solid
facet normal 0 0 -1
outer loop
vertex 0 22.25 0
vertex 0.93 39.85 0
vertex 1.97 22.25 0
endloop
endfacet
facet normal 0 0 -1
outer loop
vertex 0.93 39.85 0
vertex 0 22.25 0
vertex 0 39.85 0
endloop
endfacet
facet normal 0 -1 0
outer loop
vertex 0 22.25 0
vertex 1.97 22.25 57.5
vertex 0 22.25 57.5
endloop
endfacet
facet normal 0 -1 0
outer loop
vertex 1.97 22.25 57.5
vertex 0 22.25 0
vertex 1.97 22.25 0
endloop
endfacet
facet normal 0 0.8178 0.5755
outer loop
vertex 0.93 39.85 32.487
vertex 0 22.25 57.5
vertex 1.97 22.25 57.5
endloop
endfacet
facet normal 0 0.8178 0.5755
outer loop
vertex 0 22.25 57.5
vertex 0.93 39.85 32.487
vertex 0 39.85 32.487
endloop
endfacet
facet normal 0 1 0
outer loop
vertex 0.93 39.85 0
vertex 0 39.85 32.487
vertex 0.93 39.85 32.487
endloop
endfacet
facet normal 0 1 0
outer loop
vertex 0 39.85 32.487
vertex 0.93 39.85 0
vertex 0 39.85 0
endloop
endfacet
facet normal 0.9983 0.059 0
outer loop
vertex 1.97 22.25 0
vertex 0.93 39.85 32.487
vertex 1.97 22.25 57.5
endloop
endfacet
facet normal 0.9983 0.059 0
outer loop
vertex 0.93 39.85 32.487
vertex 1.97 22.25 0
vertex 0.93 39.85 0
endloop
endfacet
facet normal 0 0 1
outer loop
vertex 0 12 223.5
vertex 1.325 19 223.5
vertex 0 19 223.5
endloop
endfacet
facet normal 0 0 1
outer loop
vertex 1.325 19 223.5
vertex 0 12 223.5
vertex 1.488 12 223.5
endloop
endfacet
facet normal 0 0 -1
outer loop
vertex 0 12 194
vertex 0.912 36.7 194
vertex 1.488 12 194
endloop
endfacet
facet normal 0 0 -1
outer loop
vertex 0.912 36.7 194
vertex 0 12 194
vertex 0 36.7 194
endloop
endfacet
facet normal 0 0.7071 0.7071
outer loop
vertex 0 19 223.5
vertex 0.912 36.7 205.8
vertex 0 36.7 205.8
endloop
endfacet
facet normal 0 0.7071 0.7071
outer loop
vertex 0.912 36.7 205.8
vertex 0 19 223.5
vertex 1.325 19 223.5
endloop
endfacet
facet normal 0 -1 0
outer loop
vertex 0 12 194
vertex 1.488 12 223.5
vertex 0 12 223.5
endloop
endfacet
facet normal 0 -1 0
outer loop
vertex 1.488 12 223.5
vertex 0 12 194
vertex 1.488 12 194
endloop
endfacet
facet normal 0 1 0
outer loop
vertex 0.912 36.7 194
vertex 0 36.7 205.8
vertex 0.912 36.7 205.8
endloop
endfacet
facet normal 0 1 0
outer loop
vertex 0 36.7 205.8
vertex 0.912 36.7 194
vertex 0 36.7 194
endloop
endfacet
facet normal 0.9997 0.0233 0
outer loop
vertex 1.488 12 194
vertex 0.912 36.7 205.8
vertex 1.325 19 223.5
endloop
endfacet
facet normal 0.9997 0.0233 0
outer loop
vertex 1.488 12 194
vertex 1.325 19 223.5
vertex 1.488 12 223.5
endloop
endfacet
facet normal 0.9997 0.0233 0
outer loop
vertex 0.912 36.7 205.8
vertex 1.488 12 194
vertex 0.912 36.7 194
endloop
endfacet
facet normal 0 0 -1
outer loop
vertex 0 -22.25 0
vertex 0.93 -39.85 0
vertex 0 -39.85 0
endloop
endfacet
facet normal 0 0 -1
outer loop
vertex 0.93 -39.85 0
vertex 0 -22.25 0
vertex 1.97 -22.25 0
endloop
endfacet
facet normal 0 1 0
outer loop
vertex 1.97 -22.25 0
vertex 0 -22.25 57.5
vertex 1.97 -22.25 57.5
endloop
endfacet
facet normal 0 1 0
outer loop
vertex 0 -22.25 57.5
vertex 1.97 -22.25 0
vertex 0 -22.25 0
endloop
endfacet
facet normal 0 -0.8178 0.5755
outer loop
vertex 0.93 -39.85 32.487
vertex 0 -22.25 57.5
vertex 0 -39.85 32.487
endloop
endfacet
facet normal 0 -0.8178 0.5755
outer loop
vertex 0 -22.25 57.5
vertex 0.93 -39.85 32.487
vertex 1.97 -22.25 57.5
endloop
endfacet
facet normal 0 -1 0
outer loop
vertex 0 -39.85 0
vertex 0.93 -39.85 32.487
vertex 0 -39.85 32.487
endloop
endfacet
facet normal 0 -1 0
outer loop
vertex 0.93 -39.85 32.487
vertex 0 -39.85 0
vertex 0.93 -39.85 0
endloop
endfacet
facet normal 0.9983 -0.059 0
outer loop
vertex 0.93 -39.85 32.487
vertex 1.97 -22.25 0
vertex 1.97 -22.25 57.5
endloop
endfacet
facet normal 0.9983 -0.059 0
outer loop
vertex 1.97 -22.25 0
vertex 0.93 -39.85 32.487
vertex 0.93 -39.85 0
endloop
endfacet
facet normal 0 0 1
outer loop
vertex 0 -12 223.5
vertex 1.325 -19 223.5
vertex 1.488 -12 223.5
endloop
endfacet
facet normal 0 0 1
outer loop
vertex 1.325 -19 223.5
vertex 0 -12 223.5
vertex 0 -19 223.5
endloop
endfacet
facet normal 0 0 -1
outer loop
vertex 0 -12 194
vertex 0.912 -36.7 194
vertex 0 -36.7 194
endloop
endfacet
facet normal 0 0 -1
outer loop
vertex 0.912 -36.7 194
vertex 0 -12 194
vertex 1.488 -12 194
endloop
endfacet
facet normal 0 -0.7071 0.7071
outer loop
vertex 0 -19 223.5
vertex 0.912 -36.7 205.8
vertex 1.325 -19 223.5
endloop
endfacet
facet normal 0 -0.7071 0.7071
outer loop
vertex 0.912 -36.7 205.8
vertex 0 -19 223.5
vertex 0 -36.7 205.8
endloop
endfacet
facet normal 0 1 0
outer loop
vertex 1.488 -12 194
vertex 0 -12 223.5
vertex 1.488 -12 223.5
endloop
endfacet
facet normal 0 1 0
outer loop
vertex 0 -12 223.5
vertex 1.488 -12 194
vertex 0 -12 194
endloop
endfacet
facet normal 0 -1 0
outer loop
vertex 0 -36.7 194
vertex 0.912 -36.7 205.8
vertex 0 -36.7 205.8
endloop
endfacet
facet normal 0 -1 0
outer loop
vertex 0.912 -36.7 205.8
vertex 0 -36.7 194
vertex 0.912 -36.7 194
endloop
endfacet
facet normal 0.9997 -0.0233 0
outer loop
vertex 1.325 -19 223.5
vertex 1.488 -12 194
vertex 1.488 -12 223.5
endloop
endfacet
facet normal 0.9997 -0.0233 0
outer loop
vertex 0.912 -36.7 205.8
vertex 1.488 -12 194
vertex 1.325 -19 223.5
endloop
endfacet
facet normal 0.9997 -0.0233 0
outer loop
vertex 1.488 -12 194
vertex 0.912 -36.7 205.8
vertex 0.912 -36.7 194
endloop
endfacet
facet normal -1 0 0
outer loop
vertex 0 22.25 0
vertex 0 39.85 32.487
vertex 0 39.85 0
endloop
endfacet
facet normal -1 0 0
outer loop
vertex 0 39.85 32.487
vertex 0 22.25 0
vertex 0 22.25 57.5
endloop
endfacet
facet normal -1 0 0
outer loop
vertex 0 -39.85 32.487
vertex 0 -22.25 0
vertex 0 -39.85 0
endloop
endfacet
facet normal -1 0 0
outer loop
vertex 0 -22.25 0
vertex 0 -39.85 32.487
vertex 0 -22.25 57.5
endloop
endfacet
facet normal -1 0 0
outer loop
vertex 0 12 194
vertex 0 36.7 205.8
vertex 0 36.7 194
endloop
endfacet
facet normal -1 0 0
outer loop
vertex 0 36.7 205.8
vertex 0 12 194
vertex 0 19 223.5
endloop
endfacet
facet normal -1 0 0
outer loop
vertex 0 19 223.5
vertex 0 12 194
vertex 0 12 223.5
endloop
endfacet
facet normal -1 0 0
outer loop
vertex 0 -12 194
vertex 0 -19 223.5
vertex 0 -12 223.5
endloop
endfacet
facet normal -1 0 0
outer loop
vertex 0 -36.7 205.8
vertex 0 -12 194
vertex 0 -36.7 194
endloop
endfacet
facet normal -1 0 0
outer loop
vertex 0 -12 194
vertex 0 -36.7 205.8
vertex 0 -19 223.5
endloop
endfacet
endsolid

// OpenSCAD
// Windward flap halves only (print scale) — solid body for the hex MMU black
// assembly without open submesh extracts.
use <starship_parametric.scad>

print_height_mm = 260.5;
ship_h_m = 52.1;

$fa = 0.5;
$fs = 0.03;

scale(print_height_mm / ship_h_m)
    flaps_tiles();
